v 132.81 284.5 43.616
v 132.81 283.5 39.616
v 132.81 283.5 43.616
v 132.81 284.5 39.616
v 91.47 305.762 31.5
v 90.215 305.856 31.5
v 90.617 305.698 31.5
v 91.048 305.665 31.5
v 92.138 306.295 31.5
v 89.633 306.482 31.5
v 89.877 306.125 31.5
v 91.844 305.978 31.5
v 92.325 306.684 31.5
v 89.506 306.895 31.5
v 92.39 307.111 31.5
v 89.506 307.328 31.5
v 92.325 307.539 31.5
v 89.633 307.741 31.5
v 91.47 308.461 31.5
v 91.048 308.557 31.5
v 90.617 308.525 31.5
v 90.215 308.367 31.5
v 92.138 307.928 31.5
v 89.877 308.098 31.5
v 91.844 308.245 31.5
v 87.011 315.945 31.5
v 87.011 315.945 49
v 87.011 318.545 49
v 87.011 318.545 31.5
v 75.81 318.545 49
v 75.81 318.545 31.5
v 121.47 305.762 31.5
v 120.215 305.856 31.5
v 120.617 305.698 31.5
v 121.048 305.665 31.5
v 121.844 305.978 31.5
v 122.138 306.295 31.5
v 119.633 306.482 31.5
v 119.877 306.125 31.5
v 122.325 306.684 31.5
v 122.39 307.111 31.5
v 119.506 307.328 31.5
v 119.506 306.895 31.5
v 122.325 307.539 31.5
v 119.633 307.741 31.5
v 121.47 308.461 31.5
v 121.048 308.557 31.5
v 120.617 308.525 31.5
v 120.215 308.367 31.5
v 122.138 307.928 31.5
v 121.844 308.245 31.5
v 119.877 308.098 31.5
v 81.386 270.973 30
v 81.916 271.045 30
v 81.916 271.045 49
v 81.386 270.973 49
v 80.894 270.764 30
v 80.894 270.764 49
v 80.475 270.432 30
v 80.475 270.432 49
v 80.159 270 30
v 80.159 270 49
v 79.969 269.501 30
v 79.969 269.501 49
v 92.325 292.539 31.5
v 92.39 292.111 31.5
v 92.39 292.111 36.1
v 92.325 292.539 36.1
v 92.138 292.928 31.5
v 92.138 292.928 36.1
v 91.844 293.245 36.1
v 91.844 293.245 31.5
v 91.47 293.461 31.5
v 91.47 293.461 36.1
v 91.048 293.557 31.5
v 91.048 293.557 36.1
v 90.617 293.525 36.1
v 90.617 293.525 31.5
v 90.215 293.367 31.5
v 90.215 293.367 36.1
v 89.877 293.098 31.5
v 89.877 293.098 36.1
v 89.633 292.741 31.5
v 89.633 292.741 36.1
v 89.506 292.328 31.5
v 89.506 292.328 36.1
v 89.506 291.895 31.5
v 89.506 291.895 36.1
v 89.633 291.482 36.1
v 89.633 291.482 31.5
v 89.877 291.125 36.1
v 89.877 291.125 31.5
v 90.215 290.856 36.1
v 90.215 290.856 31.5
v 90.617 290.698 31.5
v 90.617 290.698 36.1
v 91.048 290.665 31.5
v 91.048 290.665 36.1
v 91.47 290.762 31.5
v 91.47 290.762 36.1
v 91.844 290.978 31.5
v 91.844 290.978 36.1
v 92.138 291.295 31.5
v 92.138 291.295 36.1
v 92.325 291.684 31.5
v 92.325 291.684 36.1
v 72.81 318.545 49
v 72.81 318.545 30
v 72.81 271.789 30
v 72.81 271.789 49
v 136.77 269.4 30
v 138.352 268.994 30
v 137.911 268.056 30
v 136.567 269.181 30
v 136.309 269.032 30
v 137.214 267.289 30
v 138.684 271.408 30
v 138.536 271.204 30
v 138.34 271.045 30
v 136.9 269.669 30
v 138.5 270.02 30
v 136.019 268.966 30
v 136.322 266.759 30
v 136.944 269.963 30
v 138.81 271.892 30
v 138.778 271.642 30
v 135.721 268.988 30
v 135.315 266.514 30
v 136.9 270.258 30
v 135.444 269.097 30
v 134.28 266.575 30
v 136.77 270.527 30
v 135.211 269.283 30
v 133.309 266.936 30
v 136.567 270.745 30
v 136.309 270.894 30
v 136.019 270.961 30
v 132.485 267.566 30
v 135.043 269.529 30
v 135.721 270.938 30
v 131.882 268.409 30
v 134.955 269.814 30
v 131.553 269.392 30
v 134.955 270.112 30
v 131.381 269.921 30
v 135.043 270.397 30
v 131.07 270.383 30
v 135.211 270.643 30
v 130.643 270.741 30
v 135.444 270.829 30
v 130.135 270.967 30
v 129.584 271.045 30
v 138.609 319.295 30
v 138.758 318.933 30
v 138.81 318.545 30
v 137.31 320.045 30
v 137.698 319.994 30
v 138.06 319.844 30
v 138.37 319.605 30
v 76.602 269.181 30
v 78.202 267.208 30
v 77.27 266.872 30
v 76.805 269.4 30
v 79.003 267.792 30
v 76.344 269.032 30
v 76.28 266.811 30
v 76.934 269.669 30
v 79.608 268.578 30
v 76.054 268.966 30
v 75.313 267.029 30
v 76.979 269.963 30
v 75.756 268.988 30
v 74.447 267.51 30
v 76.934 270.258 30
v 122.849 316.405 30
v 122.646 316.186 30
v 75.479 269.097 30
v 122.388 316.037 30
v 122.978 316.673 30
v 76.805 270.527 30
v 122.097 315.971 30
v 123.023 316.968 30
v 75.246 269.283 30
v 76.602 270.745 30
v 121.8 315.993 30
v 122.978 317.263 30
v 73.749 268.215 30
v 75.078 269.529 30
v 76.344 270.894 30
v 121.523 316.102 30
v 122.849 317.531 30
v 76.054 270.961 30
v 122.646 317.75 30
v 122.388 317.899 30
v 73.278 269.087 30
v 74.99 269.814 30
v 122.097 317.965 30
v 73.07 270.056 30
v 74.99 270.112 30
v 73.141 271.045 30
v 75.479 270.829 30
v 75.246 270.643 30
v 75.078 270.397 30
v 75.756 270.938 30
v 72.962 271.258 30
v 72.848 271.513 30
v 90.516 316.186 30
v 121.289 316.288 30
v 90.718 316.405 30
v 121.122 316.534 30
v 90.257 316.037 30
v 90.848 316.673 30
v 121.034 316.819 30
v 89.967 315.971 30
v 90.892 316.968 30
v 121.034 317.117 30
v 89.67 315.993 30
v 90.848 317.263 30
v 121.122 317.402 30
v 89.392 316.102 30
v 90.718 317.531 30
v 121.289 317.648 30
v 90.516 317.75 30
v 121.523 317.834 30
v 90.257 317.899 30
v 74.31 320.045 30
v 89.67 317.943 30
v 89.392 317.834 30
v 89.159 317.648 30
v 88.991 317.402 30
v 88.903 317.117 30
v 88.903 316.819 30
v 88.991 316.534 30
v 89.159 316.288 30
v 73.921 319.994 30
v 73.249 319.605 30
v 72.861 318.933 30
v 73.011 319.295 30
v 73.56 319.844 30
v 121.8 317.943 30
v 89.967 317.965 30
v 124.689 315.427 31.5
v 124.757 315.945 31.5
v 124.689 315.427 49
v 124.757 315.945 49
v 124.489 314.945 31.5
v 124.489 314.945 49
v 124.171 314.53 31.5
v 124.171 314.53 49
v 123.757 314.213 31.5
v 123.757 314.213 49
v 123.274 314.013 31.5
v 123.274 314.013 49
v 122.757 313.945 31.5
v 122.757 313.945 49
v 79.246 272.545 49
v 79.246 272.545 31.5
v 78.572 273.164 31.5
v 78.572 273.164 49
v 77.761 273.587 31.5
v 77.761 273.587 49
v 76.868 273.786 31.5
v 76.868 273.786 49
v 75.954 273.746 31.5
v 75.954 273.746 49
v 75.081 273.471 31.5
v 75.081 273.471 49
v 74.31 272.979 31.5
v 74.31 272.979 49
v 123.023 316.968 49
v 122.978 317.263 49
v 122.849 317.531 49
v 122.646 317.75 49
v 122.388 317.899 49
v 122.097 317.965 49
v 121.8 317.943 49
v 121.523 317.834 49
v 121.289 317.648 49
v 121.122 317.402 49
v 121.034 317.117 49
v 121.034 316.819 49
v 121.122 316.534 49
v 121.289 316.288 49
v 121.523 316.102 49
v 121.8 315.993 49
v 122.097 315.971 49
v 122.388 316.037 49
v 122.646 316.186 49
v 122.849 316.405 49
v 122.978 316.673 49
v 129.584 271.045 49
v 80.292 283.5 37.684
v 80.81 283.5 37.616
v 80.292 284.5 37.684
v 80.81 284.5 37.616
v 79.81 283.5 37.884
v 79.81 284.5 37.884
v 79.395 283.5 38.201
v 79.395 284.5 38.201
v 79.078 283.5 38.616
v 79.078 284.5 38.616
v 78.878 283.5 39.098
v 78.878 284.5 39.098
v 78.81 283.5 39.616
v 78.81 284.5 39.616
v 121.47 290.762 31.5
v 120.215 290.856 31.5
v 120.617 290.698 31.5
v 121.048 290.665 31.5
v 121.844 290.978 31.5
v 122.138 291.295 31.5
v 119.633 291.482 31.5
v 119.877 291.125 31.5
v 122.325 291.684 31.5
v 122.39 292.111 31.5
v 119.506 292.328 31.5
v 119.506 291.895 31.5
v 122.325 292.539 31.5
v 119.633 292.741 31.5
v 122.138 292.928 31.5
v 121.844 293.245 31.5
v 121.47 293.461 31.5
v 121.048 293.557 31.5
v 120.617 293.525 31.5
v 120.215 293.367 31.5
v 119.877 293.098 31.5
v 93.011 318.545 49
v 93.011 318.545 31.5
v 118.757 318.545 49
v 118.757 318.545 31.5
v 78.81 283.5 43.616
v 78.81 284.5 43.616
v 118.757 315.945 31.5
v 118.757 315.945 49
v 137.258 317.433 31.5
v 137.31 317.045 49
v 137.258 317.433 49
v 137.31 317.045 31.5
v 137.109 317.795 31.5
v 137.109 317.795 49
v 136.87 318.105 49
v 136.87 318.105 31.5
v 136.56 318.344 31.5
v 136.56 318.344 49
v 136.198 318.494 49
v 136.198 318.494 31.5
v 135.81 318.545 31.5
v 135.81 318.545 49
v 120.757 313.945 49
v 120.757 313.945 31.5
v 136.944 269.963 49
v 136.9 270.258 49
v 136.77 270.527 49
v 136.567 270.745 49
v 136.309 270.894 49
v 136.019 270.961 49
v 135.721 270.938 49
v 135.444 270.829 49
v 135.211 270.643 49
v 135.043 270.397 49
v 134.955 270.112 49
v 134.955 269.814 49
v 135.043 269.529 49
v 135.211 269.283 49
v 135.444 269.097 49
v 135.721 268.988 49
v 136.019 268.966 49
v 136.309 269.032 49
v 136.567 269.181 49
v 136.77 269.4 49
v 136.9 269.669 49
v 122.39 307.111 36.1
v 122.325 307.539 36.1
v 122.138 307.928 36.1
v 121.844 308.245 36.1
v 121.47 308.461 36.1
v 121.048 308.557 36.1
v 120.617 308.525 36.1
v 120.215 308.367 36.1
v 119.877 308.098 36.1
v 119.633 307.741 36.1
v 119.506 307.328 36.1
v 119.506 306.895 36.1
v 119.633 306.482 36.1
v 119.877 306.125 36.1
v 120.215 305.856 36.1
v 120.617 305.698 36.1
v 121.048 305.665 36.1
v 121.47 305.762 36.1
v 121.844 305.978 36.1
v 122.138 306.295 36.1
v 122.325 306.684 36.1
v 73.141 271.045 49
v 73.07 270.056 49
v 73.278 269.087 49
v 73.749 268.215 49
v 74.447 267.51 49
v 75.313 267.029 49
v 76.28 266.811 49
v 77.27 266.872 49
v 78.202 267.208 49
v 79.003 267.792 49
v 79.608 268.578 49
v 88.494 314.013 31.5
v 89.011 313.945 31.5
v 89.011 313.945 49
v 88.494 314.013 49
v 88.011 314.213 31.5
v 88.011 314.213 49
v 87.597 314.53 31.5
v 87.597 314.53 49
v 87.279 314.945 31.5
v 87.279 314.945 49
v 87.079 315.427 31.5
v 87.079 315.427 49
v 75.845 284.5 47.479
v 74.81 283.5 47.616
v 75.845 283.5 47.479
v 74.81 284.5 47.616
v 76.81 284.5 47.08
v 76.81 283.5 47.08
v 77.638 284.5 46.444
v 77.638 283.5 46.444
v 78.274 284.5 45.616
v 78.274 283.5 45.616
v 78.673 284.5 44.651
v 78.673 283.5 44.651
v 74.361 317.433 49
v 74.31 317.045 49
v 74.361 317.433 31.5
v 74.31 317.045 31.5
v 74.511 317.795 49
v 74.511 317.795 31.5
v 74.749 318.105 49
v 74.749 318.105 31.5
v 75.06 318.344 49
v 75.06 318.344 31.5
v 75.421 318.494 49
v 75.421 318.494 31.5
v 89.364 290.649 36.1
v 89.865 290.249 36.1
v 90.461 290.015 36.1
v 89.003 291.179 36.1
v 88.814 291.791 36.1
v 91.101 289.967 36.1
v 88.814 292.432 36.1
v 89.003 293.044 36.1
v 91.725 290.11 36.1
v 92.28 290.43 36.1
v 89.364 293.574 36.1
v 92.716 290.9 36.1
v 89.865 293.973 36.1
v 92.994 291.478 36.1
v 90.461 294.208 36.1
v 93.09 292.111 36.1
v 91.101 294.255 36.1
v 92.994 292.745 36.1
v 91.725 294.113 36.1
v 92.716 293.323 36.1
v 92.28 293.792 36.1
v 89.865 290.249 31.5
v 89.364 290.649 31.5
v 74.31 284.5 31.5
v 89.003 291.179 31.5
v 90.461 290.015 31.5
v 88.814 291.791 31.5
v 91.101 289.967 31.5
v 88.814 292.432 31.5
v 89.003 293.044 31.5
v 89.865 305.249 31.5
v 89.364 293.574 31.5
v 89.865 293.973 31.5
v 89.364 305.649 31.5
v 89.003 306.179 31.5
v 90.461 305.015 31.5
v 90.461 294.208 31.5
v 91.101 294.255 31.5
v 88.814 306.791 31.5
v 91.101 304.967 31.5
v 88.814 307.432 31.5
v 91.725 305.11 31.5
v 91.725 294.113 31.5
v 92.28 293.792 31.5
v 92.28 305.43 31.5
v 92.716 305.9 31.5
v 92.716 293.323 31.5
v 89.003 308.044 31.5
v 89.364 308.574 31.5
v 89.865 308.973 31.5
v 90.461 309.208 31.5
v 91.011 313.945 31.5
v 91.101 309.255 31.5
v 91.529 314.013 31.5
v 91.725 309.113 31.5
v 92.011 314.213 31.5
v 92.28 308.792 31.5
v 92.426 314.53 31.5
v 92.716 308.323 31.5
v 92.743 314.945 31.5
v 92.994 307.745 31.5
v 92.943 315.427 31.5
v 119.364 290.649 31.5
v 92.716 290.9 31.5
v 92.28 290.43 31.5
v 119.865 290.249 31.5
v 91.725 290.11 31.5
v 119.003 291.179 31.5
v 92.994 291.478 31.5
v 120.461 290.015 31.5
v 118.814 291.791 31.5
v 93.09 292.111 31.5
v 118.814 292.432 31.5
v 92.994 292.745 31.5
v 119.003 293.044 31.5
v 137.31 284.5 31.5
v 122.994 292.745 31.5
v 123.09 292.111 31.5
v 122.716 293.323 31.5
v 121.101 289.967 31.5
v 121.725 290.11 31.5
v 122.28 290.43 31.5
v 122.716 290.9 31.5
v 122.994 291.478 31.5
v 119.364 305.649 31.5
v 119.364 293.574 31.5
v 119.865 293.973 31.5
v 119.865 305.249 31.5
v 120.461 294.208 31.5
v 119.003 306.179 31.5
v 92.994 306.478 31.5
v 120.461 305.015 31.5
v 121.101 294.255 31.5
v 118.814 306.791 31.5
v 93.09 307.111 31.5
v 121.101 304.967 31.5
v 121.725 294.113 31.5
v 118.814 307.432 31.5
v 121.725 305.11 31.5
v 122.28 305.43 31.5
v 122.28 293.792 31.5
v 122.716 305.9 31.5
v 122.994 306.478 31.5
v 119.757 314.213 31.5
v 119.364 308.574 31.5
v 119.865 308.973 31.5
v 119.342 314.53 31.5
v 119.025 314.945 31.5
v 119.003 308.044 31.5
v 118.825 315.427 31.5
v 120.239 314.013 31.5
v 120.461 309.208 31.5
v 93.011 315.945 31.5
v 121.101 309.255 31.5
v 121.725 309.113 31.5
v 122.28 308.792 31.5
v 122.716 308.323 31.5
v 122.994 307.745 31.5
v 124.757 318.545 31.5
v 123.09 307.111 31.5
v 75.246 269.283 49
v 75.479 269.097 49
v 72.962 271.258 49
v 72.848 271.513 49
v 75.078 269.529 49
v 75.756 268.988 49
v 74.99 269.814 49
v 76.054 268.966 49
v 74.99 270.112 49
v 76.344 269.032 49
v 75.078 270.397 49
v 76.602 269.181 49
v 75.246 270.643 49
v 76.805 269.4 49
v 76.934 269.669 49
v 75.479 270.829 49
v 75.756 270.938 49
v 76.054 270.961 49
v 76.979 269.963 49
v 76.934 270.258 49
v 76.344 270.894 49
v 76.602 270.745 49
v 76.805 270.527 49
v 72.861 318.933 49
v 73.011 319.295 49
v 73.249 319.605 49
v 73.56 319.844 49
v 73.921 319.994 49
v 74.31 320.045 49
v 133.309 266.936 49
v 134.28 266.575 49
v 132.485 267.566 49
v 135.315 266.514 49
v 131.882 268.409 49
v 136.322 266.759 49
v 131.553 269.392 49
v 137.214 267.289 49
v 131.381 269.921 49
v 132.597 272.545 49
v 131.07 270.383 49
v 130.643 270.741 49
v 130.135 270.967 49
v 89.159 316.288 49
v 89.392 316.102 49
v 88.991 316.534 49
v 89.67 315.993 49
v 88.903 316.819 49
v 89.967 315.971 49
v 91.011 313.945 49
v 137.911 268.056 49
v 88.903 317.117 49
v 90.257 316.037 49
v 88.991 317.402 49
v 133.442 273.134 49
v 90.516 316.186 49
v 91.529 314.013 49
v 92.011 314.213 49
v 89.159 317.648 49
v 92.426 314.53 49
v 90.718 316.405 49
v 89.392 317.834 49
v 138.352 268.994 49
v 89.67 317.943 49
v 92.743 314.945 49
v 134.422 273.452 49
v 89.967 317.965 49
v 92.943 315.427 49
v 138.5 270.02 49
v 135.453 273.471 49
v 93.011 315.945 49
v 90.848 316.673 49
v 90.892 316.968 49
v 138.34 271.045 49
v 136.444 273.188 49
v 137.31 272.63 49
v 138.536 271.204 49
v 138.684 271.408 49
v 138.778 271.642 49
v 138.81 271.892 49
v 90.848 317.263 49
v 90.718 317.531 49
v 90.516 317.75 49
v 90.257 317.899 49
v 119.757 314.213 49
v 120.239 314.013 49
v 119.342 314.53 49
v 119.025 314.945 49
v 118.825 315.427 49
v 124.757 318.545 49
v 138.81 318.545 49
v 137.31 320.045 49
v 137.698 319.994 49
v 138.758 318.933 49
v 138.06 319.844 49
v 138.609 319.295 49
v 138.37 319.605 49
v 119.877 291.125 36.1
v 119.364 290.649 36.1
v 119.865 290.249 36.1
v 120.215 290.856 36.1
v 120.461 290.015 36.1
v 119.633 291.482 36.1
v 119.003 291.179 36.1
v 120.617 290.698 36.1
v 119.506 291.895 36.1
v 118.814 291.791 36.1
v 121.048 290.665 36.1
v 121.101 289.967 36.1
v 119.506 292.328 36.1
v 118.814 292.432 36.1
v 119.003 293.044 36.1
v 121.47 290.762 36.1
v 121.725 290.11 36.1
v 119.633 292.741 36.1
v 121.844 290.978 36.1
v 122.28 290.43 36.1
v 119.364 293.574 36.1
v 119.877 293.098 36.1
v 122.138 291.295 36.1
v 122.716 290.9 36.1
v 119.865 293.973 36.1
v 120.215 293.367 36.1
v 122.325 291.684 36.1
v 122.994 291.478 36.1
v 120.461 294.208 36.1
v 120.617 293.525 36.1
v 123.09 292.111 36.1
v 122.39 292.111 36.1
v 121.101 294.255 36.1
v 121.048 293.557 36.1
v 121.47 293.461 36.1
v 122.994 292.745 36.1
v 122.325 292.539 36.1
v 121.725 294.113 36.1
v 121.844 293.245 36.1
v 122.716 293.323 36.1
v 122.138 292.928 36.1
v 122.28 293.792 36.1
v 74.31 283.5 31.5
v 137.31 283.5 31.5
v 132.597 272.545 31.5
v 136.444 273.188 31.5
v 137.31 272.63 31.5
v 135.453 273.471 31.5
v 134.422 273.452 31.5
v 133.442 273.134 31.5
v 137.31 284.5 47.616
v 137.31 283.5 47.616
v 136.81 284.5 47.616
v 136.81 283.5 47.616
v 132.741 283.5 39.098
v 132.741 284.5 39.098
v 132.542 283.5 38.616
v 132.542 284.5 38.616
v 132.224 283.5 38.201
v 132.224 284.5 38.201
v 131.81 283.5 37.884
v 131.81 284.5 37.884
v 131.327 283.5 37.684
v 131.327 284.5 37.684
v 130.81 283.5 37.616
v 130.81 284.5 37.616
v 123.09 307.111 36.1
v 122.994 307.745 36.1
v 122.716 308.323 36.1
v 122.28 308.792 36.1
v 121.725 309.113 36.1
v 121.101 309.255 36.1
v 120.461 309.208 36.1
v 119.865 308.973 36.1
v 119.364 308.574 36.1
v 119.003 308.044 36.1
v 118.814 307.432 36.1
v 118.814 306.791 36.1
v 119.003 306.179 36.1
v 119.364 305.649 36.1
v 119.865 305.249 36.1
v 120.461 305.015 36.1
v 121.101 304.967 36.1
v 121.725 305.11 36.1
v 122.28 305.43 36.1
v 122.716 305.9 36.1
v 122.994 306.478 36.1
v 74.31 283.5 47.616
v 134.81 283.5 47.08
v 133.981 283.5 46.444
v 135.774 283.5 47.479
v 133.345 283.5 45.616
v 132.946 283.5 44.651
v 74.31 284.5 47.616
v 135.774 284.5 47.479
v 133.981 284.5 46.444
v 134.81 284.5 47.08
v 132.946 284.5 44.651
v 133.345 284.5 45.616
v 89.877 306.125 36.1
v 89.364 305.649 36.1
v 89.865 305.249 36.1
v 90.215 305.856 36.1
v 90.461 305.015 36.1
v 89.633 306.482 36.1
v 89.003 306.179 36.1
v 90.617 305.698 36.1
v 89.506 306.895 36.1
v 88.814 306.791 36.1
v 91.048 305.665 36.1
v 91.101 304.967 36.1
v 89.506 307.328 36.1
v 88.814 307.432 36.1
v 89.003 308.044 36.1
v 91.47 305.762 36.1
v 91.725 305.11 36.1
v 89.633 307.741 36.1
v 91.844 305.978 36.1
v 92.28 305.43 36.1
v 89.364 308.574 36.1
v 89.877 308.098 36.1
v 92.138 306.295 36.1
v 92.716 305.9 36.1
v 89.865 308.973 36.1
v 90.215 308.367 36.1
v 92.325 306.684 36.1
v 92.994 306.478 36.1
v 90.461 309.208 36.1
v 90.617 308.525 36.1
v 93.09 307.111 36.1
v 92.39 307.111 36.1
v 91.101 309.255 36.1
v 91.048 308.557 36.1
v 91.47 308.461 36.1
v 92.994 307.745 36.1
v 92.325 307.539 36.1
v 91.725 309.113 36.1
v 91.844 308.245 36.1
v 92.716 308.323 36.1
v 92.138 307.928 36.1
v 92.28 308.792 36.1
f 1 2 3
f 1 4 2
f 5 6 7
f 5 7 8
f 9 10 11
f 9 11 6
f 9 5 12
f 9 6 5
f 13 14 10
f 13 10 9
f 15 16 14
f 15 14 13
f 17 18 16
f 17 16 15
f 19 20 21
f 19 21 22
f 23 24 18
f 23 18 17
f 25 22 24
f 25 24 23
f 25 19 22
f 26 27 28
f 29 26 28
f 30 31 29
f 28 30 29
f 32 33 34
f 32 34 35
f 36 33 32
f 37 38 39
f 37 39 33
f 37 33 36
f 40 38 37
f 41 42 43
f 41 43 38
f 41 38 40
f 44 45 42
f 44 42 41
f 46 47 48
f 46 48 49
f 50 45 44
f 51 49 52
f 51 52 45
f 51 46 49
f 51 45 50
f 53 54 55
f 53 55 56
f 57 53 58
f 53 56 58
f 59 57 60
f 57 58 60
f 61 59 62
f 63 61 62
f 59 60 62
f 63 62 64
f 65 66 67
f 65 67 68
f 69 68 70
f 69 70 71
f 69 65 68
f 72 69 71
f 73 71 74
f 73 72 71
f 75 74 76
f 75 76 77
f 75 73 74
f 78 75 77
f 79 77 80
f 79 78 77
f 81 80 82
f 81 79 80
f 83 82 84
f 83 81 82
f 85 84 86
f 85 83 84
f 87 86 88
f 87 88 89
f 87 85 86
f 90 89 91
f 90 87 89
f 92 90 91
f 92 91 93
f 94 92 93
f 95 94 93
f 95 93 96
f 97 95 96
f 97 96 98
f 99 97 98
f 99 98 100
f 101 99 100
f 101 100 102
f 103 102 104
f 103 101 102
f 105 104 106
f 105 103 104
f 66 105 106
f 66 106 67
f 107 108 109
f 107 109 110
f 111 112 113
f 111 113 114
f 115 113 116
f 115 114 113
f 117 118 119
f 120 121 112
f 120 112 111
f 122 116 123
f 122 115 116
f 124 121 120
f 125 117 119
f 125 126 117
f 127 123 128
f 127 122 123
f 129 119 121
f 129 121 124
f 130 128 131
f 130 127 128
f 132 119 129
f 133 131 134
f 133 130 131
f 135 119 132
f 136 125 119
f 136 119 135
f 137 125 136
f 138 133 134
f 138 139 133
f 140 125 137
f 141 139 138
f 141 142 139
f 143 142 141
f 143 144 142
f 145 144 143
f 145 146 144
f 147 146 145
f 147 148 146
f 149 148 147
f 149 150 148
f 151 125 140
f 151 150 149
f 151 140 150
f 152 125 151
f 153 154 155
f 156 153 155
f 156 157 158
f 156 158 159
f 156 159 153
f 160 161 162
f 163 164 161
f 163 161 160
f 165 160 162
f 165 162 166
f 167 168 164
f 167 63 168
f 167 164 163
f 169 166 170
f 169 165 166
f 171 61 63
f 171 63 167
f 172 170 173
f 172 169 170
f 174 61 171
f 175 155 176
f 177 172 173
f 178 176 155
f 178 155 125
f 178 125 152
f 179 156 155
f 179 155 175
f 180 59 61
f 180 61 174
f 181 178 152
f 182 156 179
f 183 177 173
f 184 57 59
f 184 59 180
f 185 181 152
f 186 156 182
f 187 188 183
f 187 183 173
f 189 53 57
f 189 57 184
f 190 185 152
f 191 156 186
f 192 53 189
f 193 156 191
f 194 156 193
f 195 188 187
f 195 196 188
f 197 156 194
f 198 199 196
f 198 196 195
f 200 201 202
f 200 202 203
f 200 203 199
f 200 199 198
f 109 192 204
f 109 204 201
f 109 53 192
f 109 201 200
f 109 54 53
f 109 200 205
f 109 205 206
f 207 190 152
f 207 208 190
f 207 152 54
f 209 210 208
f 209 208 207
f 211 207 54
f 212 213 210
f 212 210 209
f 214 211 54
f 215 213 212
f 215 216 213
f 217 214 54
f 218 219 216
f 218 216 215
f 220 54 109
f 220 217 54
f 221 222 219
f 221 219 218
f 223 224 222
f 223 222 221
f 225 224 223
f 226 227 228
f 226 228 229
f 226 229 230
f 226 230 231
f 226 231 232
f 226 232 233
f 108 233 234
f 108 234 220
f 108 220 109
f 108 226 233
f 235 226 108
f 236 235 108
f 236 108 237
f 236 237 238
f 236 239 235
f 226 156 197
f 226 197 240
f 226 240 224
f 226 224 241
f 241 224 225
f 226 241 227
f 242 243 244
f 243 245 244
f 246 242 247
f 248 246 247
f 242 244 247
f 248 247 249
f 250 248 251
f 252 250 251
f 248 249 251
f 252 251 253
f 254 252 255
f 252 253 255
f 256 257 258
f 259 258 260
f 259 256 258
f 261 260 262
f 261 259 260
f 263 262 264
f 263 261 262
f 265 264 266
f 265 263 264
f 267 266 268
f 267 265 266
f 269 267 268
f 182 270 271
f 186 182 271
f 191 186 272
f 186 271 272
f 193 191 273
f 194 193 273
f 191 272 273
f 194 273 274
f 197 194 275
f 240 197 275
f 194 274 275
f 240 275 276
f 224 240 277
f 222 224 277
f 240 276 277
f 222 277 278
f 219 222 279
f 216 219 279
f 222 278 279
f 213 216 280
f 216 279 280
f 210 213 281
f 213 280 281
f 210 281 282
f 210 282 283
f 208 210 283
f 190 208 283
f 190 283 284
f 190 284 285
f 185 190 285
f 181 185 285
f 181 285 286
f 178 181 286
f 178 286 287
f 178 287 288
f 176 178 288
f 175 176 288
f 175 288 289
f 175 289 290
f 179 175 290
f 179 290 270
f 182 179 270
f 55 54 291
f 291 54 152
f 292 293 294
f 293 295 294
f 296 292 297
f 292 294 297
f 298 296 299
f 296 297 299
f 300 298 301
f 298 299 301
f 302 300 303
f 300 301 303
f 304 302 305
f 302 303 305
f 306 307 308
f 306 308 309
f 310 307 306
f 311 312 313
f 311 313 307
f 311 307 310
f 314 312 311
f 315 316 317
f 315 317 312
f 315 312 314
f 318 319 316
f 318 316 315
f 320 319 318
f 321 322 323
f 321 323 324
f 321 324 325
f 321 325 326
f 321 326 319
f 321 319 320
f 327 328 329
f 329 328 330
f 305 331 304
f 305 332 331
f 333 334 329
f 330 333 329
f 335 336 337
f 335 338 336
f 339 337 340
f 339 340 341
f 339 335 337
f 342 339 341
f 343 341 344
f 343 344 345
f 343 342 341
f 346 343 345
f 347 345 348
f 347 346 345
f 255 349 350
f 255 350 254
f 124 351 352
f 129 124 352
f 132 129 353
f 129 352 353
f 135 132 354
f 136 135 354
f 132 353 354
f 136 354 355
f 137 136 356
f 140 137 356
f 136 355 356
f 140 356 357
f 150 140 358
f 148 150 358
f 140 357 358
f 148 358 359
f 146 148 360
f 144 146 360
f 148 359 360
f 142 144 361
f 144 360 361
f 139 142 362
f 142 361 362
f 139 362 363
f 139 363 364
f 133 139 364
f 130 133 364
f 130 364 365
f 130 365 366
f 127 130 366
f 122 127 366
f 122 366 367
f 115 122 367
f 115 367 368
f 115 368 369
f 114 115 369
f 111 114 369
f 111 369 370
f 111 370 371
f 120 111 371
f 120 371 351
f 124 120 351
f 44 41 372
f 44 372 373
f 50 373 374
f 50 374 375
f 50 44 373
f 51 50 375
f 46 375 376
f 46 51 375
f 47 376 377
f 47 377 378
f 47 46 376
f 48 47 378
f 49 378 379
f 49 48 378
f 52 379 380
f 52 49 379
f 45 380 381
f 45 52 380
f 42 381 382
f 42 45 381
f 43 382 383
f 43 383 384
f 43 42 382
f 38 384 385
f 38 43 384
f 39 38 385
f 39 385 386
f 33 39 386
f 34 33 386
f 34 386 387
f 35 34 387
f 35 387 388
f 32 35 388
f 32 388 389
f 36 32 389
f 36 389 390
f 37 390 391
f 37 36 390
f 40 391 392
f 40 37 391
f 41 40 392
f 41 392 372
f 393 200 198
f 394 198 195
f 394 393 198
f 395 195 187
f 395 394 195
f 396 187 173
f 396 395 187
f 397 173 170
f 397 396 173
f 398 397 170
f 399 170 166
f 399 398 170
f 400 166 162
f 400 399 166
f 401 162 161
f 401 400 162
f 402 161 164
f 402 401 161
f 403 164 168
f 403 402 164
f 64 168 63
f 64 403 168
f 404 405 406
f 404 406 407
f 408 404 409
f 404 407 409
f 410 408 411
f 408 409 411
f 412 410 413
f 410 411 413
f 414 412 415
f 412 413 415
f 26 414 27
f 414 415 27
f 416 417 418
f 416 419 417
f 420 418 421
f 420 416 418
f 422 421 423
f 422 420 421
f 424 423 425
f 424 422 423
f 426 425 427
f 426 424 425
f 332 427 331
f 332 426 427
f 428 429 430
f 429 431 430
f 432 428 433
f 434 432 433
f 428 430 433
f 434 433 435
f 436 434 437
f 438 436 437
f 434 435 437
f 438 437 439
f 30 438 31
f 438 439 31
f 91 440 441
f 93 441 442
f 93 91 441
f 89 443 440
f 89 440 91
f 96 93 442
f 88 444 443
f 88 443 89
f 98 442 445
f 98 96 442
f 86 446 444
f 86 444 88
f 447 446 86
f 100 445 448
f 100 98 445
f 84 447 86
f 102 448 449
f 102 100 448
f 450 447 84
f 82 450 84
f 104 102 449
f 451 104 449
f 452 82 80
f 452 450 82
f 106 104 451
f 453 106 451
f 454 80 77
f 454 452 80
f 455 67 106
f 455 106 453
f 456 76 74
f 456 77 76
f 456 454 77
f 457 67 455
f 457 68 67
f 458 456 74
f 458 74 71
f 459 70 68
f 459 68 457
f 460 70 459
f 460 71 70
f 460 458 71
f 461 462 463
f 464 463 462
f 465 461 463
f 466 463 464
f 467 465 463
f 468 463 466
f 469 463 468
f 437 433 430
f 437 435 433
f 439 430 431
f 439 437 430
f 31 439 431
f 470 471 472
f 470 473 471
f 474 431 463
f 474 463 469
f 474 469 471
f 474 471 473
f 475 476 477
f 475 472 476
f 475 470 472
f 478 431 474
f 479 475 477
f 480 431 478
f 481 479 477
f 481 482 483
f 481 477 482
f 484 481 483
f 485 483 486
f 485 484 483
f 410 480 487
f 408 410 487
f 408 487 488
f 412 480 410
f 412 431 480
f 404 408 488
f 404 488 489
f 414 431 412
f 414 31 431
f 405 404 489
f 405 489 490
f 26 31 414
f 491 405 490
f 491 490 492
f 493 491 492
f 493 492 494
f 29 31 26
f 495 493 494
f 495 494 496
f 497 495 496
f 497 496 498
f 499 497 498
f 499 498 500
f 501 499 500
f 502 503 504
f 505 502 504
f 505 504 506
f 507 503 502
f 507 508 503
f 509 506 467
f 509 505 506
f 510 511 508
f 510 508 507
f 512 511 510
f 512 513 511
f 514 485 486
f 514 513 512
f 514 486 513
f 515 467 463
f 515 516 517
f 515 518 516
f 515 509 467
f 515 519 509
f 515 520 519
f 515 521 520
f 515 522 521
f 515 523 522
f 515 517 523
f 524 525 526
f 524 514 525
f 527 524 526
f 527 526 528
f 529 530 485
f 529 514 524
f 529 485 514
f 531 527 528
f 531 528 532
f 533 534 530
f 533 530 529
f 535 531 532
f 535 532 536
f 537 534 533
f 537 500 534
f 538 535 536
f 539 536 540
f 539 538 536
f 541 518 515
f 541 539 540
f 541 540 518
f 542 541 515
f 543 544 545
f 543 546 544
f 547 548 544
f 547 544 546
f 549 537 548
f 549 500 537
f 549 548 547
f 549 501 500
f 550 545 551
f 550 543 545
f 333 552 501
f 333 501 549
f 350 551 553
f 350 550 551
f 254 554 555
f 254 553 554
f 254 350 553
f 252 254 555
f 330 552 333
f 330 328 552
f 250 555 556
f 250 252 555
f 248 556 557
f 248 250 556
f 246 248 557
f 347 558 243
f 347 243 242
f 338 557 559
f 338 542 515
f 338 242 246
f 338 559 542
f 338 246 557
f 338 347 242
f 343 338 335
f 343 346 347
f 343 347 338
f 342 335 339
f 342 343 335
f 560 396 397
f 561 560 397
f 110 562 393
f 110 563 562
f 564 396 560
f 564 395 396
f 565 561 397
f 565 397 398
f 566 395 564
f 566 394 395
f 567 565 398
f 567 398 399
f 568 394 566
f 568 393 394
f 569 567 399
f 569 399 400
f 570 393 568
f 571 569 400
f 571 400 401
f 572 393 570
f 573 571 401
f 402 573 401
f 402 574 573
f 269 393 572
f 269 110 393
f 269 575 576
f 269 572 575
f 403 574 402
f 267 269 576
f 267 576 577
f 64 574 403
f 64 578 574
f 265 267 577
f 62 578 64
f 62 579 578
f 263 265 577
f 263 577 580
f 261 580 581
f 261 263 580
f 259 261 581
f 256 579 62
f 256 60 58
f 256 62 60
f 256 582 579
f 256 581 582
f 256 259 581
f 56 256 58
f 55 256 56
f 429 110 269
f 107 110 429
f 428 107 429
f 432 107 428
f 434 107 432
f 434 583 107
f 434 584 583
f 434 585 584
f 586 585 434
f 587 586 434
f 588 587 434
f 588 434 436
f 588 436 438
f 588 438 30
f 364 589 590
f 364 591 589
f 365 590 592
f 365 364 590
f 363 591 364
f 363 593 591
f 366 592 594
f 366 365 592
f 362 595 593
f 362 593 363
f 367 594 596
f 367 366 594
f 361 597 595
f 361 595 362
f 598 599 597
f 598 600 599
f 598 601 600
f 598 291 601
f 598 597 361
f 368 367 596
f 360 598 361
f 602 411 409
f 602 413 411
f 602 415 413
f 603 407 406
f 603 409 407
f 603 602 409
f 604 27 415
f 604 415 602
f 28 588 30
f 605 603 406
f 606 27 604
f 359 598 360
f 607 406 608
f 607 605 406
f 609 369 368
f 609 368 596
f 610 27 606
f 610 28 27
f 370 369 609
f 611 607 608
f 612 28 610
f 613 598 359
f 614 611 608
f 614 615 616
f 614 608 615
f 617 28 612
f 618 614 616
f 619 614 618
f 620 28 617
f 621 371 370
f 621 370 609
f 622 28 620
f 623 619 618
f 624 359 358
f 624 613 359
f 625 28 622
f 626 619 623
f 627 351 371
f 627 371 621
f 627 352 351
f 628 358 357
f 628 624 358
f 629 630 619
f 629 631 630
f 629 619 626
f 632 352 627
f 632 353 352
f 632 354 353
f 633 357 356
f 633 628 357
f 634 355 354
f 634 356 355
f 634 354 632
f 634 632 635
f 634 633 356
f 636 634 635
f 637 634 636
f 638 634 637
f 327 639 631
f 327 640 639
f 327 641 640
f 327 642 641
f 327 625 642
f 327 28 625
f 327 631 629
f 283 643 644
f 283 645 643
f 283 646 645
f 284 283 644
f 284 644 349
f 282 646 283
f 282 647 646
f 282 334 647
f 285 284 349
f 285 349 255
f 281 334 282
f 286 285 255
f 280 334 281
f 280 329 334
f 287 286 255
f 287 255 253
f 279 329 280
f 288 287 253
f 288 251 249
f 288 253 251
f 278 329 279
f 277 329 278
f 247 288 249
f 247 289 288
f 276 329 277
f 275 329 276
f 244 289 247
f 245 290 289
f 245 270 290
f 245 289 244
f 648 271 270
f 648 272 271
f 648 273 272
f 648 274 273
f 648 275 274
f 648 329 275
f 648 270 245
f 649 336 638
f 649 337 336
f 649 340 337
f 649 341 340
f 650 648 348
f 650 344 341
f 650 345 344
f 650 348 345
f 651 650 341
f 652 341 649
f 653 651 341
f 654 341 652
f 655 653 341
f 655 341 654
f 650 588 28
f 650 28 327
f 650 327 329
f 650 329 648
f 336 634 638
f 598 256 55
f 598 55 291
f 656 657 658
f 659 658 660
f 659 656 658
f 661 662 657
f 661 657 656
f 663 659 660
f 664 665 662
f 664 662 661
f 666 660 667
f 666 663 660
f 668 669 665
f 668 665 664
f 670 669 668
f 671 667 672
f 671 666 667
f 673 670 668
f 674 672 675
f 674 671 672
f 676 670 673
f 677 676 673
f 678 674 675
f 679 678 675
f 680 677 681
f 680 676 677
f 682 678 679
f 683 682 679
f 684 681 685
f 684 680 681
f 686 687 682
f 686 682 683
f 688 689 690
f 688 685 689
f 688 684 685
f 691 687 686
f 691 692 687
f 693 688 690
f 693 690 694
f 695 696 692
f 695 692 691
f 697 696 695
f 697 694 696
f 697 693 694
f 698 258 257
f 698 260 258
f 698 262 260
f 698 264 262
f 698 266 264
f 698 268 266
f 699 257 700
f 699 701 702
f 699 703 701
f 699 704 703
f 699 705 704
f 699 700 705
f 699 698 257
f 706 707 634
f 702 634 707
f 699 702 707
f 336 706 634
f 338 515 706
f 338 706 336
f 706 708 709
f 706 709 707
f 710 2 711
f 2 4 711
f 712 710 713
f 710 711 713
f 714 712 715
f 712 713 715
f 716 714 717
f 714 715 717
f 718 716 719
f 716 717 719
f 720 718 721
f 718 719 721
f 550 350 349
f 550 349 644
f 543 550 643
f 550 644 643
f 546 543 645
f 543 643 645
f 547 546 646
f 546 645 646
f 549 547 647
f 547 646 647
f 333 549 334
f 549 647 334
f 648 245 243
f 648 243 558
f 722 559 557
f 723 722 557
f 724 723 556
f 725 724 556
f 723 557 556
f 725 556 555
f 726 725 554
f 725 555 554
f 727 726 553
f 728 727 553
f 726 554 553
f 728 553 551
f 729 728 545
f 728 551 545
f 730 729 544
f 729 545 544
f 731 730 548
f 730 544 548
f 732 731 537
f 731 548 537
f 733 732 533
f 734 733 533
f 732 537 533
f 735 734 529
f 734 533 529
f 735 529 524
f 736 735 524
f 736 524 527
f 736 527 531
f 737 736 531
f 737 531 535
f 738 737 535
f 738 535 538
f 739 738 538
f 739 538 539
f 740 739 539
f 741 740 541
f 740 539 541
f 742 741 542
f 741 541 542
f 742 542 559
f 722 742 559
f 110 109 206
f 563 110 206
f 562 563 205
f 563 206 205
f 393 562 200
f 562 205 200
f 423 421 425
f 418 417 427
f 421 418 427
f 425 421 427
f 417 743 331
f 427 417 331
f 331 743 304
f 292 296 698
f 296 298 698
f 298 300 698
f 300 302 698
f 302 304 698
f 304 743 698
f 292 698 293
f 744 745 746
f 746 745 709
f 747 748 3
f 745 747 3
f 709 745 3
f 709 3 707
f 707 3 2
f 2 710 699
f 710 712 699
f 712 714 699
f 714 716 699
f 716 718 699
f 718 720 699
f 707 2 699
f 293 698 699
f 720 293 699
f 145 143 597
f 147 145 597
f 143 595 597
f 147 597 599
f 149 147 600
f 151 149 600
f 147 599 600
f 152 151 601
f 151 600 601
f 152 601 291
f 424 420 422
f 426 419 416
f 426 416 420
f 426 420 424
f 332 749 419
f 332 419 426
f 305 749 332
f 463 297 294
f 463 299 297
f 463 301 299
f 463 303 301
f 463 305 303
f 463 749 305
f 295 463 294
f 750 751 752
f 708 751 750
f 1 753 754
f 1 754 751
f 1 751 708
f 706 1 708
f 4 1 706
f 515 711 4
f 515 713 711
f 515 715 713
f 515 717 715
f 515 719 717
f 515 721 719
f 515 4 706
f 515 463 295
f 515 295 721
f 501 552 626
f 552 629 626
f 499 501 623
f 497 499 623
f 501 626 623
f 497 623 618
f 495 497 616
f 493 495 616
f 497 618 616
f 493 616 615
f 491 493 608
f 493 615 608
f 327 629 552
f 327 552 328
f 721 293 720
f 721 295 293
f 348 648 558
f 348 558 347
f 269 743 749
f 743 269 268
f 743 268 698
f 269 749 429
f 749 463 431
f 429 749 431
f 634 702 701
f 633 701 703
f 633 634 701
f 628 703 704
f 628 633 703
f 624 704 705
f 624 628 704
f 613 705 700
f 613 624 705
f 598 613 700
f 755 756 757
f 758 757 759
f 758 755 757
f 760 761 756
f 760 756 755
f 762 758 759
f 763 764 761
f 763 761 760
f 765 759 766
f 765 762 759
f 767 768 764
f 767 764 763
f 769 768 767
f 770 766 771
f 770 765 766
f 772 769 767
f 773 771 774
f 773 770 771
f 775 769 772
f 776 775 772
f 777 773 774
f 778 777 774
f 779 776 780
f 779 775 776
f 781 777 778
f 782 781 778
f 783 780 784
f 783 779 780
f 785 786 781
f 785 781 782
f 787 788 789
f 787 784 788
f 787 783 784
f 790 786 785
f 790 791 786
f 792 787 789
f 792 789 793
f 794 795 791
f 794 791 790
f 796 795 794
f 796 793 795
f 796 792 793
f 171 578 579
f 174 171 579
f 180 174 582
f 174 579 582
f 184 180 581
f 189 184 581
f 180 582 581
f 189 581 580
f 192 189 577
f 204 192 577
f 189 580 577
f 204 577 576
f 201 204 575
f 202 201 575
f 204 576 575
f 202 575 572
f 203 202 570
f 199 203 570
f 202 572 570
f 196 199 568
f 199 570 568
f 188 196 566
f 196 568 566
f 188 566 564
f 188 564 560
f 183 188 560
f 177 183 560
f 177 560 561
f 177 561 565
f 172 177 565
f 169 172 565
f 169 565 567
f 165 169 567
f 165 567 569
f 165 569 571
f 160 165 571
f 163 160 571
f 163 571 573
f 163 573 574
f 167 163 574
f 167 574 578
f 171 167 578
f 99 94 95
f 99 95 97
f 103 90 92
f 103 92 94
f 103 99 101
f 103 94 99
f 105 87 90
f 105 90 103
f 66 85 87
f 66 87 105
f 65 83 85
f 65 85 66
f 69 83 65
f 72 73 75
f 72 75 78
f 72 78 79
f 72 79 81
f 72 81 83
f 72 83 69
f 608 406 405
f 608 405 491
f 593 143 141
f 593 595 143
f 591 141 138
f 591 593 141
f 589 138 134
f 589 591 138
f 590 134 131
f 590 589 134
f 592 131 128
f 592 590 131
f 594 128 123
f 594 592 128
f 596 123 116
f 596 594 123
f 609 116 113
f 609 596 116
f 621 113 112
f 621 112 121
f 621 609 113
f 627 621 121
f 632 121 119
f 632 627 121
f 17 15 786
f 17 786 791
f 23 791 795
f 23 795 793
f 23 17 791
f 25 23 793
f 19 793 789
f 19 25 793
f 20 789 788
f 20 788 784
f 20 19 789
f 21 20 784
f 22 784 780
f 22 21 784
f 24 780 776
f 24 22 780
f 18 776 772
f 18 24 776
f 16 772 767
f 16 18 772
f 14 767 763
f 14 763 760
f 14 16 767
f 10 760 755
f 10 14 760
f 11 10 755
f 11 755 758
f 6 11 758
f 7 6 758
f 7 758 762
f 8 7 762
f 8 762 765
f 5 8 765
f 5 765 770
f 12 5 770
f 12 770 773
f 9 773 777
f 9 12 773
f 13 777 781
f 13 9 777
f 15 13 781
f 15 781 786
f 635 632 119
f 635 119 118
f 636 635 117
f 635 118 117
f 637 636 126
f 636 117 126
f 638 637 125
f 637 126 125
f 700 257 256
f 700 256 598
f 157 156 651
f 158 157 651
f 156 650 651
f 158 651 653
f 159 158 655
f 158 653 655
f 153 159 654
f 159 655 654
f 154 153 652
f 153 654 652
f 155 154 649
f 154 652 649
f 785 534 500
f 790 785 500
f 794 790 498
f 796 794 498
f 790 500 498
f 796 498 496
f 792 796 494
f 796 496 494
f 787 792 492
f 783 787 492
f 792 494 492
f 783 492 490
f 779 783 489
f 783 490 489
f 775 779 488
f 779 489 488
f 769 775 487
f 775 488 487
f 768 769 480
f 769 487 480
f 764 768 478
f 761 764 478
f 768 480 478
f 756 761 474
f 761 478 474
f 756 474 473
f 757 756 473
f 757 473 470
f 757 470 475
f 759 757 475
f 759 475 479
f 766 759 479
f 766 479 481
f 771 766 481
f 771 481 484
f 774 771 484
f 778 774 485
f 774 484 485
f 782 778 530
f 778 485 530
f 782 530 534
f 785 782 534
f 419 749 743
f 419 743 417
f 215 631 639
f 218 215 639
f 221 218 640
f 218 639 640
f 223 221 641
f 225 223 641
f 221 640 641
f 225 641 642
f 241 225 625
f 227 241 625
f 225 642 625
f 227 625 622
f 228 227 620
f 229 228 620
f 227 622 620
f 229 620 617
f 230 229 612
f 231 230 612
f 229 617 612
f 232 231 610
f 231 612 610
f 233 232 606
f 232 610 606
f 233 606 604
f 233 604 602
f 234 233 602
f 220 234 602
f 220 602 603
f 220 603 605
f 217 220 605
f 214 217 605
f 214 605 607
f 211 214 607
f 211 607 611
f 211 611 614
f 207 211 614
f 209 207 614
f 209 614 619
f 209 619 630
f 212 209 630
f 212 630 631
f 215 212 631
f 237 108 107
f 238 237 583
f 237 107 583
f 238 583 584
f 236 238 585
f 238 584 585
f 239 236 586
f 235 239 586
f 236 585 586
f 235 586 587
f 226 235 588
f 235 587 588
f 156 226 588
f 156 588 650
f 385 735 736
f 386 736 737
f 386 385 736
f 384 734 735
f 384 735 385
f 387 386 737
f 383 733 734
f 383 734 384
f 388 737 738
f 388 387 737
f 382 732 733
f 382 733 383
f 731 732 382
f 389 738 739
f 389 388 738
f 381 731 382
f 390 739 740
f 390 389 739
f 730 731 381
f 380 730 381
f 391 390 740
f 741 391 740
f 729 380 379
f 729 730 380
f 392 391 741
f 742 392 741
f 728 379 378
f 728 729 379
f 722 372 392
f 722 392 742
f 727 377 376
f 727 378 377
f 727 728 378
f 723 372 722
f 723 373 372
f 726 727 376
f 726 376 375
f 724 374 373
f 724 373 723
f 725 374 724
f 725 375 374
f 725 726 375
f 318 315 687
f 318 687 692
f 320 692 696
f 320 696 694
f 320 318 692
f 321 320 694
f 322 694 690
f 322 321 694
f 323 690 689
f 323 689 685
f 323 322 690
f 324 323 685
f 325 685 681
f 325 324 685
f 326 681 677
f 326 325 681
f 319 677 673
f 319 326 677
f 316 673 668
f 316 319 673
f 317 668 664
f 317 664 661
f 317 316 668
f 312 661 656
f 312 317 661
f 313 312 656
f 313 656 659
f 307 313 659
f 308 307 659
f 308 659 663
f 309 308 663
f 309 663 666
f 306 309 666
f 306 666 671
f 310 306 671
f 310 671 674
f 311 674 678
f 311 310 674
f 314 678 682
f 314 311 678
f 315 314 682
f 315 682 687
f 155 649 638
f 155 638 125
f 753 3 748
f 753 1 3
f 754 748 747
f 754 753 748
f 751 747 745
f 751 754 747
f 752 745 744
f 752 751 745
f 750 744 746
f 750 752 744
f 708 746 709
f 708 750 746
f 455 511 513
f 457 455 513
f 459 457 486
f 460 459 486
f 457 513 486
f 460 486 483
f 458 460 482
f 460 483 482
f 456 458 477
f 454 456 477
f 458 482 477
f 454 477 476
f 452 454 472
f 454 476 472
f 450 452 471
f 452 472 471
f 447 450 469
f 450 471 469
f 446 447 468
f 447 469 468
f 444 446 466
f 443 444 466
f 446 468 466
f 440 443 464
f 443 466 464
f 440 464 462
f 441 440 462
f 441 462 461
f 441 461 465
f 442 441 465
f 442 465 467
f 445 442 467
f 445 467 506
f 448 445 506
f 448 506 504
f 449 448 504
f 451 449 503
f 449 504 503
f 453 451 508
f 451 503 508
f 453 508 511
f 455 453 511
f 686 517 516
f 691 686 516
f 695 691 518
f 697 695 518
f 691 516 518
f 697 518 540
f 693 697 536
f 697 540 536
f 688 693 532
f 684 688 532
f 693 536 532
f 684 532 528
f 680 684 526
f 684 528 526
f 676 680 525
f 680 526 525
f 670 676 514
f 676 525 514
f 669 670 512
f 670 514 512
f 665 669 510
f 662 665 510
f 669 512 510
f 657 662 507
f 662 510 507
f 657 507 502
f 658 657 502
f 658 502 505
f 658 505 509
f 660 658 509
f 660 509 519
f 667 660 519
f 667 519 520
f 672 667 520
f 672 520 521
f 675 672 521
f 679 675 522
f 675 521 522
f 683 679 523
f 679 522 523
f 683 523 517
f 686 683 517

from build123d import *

# Parameters (mm, degrees)
SKETCH1_W           = 66
SKETCH1_H           = 49
BOSS_EXTRUDE1_DEPTH = 19
SHELL1_T            = -1.5
SKETCH2_W           = 6
SKETCH2_H           = 4.6
BOSS_EXTRUDE2_DEPTH = 17.5
FILLET1_R           = 1.5
SKETCH3_R           = 2.15
SKETCH3_R_2         = 1.45
BOSS_EXTRUDE3_DEPTH = 4.6
BOSS_EXTRUDE4_DEPTH = 0.5
FILLET2_R           = 4
FILLET3_R           = 2
BOSS_EXTRUDE5_REACH = 351.368
SKETCH5_R           = 3.5
FILLET4_R           = 2
SKETCH6_R           = 1
CUT_EXTRUDE1_DEPTH  = 350.367542449
FILLET5_R           = 1


with BuildPart() as part:
    # Sketch1 → Boss-Extrude1 (new body)
    with BuildSketch(Plane.XY.offset(30)):
        with Locations((105.809562907, 295.544660887)):
            Rectangle(SKETCH1_W, SKETCH1_H)
    extrude(amount=BOSS_EXTRUDE1_DEPTH)

    # Shell1
    shell1_openings = [part.faces().sort_by_distance(p)[0] for p in [
        (105.809562907, 295.544660887, 49),
    ]]
    offset(amount=SHELL1_T, openings=shell1_openings, kind=Kind.INTERSECTION)

    # Sketch2 → Boss-Extrude2 (add)
    with BuildSketch(Plane.XY.offset(31.5)):
        with Locations((90.011318394, 316.244660887)):
            Rectangle(SKETCH2_W, SKETCH2_H)
        with Locations((121.756668801, 316.244660887)):
            Rectangle(SKETCH2_W, SKETCH2_H)
    extrude(amount=BOSS_EXTRUDE2_DEPTH)

    # Fillet1
    fillet1_edges = [part.edges().sort_by_distance(p)[0] for p in [
        (74.309562907, 318.544660887, 40.25),
        (137.309562907, 318.544660887, 40.25),
        (72.809562907, 320.044660887, 39.5),
        (138.809562907, 320.044660887, 39.5),
    ]]
    fillet(fillet1_edges, radius=FILLET1_R)

    # Sketch3 → Boss-Extrude3 (add)
    # profile 1 of 4: a face of its own
    with BuildSketch(Plane.XY.offset(31.5)):
        with Locations((90.939840403, 307.111410879)):
            Circle(SKETCH3_R)
        with Locations((90.939840403, 307.111410879)):
            Circle(SKETCH3_R_2, mode=Mode.SUBTRACT)
    # profile 2 of 4: a face of its own
    with BuildSketch(Plane.XY.offset(31.5)):
        with Locations((120.939840403, 307.111410879)):
            Circle(SKETCH3_R)
        with Locations((120.939840403, 307.111410879)):
            Circle(SKETCH3_R_2, mode=Mode.SUBTRACT)
    # profile 3 of 4: a face of its own
    with BuildSketch(Plane.XY.offset(31.5)):
        with Locations((120.939840403, 292.111410879)):
            Circle(SKETCH3_R)
        with Locations((120.939840403, 292.111410879)):
            Circle(SKETCH3_R_2, mode=Mode.SUBTRACT)
    # profile 4 of 4: a face of its own
    with BuildSketch(Plane.XY.offset(31.5)):
        with Locations((90.939840403, 292.111410879)):
            Circle(SKETCH3_R)
        with Locations((90.939840403, 292.111410879)):
            Circle(SKETCH3_R_2, mode=Mode.SUBTRACT)
    extrude(amount=BOSS_EXTRUDE3_DEPTH)

    # Sketch4 → Boss-Extrude4 (add, symmetric)
    with BuildSketch(Plane(origin=(0, 284, 0), x_dir=(1, 0, 0), z_dir=(0, 1, 0))):
        Polygon((72.809562907, -47.615589413), (78.809562907, -47.615589413), (78.809562907, -37.615589413), (132.809562907, -37.615589413), (132.809562907, -47.615589413), (138.809562907, -47.615589413), (138.809562907, -30), (72.809562907, -30), align=None)
    extrude(amount=BOSS_EXTRUDE4_DEPTH, both=True)

    # Fillet2
    fillet2_edges = [part.edges().sort_by_distance(p)[0] for p in [
        (78.809562907, 284, 47.615589413),
        (132.809562907, 284, 47.615589413),
    ]]
    fillet(fillet2_edges, radius=FILLET2_R)

    # Fillet3
    fillet3_edges = [part.edges().sort_by_distance(p)[0] for p in [
        (78.809562907, 284, 37.615589413),
        (132.809562907, 284, 37.615589413),
    ]]
    fillet(fillet3_edges, radius=FILLET3_R)

    # Boss-Extrude5: up to this face of the body (flat: up to its plane)
    boss_extrude5_end = Plane(part.part.faces().sort_by_distance((105.809562907, 295.537442811, 30))[0])
    # Sketch5 → Boss-Extrude5 (add, up to the picked face)
    with BuildSketch(Plane.XY.offset(49), mode=Mode.PRIVATE) as boss_extrude5_sk1:
        with Locations((76.56102911, 270.299359986)):
            Circle(SKETCH5_R)
    boss_extrude5_tool1 = split(extrude(boss_extrude5_sk1.sketch, amount=-BOSS_EXTRUDE5_REACH, mode=Mode.PRIVATE), bisect_by=boss_extrude5_end, keep=Keep.BOTH, mode=Mode.PRIVATE)
    # Sketch5 → Boss-Extrude5 (add, up to the picked face)
    with BuildSketch(Plane.XY.offset(49), mode=Mode.PRIVATE) as boss_extrude5_sk2:
        with Locations((135, 270)):
            Circle(SKETCH5_R)
    boss_extrude5_tool2 = split(extrude(boss_extrude5_sk2.sketch, amount=-BOSS_EXTRUDE5_REACH, mode=Mode.PRIVATE), bisect_by=boss_extrude5_end, keep=Keep.BOTH, mode=Mode.PRIVATE)
    add(boss_extrude5_tool1.solids().sort_by(Axis((76.561029, 270.29936, 49), (0, 0, -1)))[0])
    add(boss_extrude5_tool2.solids().sort_by(Axis((135, 270, 49), (0, 0, -1)))[0])

    # Fillet4
    fillet4_edges = [part.edges().sort_by_distance(p)[0] for p in [
        (79.980755206, 271.044660887, 39.5),
        (131.659538411, 271.044660887, 39.5),
        (87.011318394, 313.944660887, 40.25),
        (93.011318394, 313.944660887, 40.25),
        (118.756668801, 313.944660887, 40.25),
        (124.756668801, 313.944660887, 40.25),
    ]]
    fillet(fillet4_edges, radius=FILLET4_R)

    # Sketch6 → Cut-Extrude1 (cut, through all)
    with BuildSketch(Plane.XY.offset(49)):
        with Locations((89.892121314, 316.968054702)):
            Circle(SKETCH6_R)
        with Locations((122.022521406, 316.968054702)):
            Circle(SKETCH6_R)
        with Locations((75.978849521, 269.963322555)):
            Circle(SKETCH6_R)
        with Locations((135.943985107, 269.963322555)):
            Circle(SKETCH6_R)
    extrude(amount=-CUT_EXTRUDE1_DEPTH, mode=Mode.SUBTRACT)

    # Fillet5
    # the kernel refuses this fillet: 1 mm, written as the material it takes off along each edge
    with BuildSketch(Plane(origin=(72.809562907, 271.044660887, 28.140180255), x_dir=(1, 0, 0), z_dir=(0, 0, 1))) as fillet5_piece_1:
        with BuildLine():
            CenterArc((1, 0.743927898), FILLET5_R, 180, 48.067095939)
            Line((0, 0.743927898), (-0.02, 0.743927898))
            Line((-0.02, 0.743927898), (-0.02, 0))
            Line((-0.02, 0), (0, -0.02))
            ThreePointArc((0, -0.02), (0.165870054, -0.02), (0.31837491, -0.014878558))
            Line((0.31837491, -0.014878558), (0.331740108, 0))
        make_face()
    extrude(amount=22.719639489, mode=Mode.SUBTRACT)
    with BuildSketch(Plane(origin=(138.809562907, 271.044660887, 27.881411748), x_dir=(-1, 0, 0), z_dir=(0, 0, 1))) as fillet5_piece_2:
        with BuildLine():
            CenterArc((1, -0.847435301), FILLET5_R, 122.066195324, 57.933804676)
            Line((0, -0.847435301), (-0.02, -0.847435301))
            Line((-0.02, -0.847435301), (-0.02, 0))
            Line((-0.02, 0), (0, 0.02))
            ThreePointArc((0, 0.02), (0.234550659, 0.02), (0.458483344, 0.016948706))
            Line((0.458483344, 0.016948706), (0.469101317, 0))
        make_face()
    extrude(amount=23.237176503, mode=Mode.SUBTRACT)


solid = part.part
